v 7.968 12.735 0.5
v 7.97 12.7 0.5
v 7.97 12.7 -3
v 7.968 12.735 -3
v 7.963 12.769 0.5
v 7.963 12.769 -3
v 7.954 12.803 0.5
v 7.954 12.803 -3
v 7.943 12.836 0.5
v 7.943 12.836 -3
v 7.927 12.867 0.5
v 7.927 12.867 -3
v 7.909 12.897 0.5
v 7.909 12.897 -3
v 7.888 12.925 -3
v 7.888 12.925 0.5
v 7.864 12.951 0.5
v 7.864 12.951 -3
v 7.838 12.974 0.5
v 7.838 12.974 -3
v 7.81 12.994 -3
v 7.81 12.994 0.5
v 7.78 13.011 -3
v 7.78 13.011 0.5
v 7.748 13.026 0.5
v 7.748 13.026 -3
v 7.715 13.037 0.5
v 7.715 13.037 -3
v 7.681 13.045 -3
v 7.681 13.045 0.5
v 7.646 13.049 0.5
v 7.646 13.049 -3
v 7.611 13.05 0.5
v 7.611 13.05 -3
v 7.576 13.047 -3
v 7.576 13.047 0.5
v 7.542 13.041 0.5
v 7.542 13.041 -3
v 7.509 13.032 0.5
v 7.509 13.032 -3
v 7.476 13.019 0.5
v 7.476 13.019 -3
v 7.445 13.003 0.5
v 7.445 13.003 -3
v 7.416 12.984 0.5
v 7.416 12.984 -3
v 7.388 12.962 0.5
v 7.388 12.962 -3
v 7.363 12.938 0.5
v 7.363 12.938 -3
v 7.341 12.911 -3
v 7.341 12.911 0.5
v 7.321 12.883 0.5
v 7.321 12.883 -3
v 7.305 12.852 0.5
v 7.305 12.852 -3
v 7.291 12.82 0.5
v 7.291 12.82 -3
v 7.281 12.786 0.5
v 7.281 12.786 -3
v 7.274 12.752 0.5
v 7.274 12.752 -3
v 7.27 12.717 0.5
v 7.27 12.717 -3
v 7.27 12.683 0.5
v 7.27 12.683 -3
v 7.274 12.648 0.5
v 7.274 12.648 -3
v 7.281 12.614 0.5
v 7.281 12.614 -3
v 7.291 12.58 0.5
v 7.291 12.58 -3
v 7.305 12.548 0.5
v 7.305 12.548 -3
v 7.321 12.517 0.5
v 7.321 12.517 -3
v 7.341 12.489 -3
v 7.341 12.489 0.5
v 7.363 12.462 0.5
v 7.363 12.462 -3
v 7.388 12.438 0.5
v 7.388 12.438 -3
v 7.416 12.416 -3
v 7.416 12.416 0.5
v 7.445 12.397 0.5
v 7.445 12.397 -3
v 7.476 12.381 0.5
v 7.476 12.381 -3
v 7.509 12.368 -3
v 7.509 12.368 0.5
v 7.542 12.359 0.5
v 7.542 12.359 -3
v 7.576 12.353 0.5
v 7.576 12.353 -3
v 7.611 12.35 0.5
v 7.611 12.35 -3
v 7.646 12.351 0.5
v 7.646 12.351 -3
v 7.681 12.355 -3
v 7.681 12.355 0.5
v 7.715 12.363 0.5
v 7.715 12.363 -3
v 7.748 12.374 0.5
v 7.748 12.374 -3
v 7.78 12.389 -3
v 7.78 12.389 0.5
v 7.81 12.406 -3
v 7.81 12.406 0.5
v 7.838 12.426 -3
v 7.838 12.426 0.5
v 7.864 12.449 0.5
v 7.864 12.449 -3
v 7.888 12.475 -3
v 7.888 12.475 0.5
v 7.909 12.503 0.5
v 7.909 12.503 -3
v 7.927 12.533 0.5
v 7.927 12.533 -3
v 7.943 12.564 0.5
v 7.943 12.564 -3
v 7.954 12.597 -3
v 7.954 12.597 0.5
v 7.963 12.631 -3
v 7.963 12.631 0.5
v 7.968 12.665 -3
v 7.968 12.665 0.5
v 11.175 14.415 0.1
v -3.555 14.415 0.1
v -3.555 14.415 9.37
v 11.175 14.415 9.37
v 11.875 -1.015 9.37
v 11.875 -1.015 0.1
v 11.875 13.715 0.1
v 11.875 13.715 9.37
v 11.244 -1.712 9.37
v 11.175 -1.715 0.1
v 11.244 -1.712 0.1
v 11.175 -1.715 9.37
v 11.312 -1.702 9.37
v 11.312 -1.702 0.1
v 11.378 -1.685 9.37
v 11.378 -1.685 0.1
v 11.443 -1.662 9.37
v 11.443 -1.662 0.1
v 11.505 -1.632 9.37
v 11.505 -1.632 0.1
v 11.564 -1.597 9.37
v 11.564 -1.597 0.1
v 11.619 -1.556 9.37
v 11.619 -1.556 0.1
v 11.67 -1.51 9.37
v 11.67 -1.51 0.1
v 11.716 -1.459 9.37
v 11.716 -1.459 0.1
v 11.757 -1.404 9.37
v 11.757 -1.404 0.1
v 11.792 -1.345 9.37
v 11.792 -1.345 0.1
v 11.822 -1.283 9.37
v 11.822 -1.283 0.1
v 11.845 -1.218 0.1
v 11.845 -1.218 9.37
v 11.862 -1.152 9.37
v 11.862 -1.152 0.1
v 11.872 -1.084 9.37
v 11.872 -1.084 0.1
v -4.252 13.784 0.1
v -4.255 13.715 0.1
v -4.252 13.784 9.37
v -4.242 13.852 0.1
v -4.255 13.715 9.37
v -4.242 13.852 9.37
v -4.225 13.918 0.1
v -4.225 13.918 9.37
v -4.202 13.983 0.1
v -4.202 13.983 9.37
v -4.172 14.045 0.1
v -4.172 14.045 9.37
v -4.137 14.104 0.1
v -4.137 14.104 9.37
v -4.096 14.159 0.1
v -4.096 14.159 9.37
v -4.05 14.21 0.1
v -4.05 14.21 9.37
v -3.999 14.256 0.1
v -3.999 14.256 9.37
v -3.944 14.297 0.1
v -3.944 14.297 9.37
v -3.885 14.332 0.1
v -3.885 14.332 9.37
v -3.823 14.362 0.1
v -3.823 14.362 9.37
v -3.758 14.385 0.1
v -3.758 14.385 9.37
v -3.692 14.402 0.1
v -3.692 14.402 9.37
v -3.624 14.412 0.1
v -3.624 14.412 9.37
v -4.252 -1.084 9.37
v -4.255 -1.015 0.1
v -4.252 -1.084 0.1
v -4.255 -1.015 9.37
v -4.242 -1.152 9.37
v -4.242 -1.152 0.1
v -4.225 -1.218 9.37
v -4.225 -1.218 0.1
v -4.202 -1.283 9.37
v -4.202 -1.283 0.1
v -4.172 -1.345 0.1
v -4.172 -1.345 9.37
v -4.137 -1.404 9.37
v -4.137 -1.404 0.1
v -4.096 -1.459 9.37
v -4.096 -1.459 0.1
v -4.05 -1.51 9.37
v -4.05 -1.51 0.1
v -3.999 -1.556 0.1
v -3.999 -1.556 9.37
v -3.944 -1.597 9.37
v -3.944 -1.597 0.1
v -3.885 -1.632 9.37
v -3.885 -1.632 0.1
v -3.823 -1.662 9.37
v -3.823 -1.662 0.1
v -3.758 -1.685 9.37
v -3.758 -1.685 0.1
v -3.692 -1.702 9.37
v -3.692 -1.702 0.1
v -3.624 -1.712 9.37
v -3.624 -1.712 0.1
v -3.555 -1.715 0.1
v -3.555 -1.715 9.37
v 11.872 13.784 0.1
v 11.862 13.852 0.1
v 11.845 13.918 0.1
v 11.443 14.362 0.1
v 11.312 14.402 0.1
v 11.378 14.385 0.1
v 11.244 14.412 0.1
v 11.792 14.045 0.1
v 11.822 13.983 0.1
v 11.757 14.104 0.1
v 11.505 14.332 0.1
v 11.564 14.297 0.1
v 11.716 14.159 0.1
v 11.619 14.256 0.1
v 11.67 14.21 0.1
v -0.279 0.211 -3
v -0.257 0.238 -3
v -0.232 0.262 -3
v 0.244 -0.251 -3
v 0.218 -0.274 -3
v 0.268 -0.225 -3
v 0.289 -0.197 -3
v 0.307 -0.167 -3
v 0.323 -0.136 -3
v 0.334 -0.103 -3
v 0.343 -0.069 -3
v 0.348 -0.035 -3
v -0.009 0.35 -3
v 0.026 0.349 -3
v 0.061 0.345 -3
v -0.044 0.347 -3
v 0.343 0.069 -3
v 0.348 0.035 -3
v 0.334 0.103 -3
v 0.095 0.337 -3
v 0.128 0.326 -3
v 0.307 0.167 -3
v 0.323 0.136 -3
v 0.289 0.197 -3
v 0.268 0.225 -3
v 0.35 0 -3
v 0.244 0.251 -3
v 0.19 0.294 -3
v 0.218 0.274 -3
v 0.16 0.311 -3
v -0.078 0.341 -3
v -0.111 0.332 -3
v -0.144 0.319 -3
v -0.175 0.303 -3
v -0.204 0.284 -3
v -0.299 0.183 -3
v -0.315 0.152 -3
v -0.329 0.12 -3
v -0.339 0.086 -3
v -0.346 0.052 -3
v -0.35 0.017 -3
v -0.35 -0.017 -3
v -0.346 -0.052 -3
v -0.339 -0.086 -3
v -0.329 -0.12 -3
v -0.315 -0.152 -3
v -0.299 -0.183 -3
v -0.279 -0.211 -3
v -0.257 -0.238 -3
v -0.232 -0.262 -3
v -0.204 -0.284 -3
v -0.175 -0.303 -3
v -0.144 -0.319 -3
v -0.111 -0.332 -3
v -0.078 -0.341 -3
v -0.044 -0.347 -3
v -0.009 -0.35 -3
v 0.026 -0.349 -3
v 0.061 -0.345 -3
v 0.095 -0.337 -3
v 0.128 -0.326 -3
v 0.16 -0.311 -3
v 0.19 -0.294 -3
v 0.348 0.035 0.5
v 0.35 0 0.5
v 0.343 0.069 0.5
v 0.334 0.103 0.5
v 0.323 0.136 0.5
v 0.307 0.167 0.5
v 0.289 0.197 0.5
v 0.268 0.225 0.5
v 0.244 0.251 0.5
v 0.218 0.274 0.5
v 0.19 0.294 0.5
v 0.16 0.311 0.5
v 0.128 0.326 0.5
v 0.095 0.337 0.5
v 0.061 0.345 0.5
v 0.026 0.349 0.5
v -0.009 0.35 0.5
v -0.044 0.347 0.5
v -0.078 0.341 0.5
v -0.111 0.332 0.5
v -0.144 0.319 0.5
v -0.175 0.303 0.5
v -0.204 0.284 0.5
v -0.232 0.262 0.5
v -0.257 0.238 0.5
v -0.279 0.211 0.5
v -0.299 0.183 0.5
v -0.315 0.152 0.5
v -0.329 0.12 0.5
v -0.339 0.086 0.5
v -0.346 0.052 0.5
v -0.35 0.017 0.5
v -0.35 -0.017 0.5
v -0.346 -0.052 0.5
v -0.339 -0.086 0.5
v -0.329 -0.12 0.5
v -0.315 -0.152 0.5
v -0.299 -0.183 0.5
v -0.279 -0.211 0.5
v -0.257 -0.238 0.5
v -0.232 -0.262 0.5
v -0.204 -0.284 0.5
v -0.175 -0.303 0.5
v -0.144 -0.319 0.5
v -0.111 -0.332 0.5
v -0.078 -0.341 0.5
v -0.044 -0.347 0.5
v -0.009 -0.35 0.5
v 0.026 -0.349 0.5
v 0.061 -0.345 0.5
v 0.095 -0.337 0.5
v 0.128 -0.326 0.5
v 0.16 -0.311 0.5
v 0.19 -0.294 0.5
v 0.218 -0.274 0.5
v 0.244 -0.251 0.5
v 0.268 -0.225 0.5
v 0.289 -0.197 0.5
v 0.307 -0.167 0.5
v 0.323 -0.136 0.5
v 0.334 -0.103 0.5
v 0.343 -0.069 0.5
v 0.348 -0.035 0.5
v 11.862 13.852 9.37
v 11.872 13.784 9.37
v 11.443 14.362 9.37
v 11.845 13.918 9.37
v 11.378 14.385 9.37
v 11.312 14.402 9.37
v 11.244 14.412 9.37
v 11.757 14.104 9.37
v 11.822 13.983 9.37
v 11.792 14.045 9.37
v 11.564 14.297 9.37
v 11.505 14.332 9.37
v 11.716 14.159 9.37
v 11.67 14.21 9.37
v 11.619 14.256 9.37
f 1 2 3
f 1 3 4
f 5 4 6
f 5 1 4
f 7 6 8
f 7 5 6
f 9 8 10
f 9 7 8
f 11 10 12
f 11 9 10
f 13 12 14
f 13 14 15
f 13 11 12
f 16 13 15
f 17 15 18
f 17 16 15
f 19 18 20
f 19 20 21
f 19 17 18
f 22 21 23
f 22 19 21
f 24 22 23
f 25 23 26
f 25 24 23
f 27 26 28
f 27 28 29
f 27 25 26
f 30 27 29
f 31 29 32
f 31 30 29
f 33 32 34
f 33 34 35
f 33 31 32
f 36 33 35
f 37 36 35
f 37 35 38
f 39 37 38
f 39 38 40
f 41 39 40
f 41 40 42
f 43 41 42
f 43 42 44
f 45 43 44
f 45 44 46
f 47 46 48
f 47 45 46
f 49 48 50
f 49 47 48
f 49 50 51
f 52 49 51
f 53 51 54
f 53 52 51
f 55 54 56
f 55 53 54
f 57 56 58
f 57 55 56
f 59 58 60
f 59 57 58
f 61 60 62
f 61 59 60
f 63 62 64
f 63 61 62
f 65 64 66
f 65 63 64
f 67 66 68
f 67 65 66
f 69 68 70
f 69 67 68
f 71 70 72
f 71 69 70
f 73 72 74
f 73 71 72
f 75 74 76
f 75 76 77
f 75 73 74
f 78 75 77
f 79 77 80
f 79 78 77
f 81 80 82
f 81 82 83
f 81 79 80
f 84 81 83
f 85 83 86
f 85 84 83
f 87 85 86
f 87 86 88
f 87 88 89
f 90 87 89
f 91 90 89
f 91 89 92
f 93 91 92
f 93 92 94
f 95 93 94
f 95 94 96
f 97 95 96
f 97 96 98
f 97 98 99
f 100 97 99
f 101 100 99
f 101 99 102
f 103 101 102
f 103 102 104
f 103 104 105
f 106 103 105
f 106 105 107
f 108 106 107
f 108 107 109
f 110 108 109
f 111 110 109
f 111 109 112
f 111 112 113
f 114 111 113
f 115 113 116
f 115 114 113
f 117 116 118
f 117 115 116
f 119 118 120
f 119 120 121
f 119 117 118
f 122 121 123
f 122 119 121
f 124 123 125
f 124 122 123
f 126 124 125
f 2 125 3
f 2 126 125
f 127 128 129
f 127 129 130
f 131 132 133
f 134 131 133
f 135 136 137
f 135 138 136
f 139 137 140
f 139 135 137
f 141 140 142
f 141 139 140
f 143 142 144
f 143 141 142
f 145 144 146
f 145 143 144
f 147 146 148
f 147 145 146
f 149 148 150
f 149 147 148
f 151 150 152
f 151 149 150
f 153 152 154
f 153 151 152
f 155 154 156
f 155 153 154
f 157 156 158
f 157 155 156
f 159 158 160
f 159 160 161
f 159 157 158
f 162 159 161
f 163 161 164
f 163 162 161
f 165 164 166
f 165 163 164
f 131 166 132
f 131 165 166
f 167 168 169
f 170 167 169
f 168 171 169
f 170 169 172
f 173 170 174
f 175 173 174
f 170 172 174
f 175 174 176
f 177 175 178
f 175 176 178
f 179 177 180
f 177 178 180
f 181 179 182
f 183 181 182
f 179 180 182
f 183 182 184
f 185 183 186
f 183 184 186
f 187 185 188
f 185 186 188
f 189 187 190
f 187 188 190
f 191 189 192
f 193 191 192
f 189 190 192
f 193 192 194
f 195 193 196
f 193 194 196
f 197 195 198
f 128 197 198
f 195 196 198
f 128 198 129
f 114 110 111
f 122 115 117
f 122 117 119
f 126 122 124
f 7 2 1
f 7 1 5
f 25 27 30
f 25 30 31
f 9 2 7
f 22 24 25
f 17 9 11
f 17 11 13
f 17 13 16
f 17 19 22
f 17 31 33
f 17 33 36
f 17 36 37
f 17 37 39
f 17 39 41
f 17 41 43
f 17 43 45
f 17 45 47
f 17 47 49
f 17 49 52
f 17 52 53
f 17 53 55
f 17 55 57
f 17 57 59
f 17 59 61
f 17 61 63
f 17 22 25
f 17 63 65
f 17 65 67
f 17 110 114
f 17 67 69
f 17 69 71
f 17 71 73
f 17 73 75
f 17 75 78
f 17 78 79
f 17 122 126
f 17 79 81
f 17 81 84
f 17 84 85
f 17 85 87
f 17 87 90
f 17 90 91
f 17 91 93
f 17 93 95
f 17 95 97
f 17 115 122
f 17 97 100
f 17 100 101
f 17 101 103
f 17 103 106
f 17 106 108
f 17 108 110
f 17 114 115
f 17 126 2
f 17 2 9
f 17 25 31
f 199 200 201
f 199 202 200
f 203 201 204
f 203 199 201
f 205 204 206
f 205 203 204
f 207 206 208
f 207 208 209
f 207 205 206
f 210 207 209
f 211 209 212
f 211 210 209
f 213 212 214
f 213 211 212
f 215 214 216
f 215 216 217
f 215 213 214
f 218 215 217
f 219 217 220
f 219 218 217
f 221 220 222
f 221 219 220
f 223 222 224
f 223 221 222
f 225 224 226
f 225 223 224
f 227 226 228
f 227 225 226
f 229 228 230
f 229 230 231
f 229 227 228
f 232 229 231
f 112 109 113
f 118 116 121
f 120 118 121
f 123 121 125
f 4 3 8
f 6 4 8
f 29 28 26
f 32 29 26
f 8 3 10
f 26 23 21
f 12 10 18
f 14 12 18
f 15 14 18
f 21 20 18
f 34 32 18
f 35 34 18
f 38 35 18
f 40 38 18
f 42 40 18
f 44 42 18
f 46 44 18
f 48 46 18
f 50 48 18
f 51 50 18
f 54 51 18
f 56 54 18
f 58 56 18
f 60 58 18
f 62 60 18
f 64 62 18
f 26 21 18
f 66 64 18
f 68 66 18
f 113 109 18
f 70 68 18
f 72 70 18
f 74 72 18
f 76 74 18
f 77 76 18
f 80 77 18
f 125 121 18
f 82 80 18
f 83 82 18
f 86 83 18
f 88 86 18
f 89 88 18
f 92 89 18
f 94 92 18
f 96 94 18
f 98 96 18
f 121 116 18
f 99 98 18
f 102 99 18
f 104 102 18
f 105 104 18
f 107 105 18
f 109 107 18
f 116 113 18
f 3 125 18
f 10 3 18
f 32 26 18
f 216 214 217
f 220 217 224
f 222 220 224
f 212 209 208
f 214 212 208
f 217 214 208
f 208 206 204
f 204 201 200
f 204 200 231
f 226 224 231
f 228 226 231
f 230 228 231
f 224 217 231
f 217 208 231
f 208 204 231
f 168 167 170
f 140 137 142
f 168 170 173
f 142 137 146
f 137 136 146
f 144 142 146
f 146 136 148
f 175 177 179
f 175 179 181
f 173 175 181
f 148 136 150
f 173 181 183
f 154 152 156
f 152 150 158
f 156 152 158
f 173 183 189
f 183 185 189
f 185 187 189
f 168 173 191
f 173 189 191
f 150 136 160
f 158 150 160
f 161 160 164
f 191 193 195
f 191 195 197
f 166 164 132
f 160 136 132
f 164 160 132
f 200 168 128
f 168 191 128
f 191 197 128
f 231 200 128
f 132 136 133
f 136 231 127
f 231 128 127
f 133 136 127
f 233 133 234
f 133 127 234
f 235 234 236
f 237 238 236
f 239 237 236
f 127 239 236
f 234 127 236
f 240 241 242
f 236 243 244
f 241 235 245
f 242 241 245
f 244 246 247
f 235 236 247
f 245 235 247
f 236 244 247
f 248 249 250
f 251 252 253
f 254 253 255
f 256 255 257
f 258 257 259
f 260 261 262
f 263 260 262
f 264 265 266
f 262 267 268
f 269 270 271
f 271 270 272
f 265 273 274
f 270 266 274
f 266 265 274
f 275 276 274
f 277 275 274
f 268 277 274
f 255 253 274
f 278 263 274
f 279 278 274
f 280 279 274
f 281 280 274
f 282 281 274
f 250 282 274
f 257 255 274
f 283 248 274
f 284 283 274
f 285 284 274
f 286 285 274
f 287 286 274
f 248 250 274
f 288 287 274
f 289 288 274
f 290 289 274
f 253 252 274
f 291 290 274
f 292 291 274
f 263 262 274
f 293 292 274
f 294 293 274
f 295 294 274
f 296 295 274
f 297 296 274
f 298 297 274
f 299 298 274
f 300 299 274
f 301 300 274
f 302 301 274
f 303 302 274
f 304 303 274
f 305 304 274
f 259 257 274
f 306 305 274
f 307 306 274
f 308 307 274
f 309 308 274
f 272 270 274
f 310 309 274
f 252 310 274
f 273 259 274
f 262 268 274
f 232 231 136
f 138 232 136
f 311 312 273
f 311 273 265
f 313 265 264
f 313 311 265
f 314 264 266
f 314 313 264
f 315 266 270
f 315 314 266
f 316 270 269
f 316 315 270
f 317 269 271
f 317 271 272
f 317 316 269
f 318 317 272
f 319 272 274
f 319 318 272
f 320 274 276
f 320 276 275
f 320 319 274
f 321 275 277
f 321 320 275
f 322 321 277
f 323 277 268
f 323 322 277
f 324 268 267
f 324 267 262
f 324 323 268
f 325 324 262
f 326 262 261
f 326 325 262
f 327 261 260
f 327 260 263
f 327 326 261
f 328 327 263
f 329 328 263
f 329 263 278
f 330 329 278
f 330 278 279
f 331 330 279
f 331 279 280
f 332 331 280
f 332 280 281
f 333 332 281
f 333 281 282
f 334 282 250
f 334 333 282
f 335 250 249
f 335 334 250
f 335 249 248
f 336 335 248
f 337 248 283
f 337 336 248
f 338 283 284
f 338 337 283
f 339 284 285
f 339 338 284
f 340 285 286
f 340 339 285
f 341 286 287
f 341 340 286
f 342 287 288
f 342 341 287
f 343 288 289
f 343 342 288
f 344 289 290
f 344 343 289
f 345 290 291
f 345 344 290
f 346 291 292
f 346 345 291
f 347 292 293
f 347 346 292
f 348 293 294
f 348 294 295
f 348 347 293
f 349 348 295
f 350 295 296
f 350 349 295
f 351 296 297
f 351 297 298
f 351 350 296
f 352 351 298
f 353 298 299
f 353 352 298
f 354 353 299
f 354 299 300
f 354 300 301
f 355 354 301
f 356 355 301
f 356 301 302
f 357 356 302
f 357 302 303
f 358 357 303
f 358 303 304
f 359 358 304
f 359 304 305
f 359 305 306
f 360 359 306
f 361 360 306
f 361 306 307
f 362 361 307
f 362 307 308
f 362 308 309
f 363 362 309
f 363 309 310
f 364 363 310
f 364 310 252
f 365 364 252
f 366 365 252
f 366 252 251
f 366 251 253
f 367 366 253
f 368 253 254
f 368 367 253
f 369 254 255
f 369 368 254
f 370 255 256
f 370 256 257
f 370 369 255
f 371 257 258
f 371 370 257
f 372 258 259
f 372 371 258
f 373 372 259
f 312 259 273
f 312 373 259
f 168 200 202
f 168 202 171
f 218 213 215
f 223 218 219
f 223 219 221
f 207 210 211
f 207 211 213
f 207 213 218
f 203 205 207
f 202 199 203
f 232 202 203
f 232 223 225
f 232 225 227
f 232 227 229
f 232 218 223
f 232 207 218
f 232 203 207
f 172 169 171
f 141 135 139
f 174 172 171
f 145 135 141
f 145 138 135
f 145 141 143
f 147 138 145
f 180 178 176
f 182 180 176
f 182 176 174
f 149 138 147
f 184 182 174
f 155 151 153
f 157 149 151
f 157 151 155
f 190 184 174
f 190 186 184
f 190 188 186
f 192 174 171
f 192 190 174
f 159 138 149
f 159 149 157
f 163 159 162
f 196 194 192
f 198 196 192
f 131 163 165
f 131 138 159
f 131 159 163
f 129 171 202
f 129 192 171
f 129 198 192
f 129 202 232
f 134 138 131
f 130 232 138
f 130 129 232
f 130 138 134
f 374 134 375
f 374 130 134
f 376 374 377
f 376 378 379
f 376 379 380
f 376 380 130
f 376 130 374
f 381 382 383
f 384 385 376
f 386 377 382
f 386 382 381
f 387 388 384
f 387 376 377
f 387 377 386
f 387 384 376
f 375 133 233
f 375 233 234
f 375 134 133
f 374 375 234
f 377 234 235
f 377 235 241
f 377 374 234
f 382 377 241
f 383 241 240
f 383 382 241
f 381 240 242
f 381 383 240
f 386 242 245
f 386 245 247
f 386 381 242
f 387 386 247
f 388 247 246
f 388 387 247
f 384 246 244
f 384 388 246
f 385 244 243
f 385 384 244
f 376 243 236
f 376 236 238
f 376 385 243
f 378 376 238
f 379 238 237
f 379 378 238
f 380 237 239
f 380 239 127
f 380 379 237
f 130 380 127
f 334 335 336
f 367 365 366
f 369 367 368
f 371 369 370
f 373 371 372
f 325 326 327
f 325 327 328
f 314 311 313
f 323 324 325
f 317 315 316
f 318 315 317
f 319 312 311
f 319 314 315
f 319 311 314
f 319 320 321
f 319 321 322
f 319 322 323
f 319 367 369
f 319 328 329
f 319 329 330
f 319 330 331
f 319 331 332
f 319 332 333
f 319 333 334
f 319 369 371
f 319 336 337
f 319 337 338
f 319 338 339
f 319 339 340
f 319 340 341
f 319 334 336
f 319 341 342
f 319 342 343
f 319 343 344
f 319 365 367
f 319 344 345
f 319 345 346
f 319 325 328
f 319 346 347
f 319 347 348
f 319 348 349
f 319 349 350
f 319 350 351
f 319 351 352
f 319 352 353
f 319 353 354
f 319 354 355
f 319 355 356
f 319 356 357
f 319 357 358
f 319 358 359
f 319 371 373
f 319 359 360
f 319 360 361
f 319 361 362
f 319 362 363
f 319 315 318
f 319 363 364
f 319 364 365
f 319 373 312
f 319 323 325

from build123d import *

# Parameters (mm, degrees)
SKETCH001_R  = 0.35
PAD001_DEPTH = 3.5
SKETCH_W     = 16.13
SKETCH_H     = 16.13
PAD_DEPTH    = 9.27
FILLET_R     = 0.7


with BuildPart() as pad001:
    # Sketch001 → Pad001 (new body)
    with BuildSketch(Plane.XY.offset(0.5)):
        Circle(SKETCH001_R)
        with Locations((7.62, 12.7)):
            Circle(SKETCH001_R)
    extrude(amount=-PAD001_DEPTH)


with BuildPart() as fillet_body:
    # Sketch → Pad (new body)
    with BuildSketch(Plane.XY.offset(0.1)):
        with Locations((3.81, 6.35)):
            Rectangle(SKETCH_W, SKETCH_H)
    extrude(amount=PAD_DEPTH)

    # Fillet
    fillet_edges = [fillet_body.edges().sort_by_distance(p)[0] for p in [
        (11.875, -1.715, 4.735),
        (11.875, 14.415, 4.735),
        (-4.255, -1.715, 4.735),
        (-4.255, 14.415, 4.735),
    ]]
    fillet(fillet_edges, radius=FILLET_R)


solid = Compound([pad001.part, fillet_body.part])
